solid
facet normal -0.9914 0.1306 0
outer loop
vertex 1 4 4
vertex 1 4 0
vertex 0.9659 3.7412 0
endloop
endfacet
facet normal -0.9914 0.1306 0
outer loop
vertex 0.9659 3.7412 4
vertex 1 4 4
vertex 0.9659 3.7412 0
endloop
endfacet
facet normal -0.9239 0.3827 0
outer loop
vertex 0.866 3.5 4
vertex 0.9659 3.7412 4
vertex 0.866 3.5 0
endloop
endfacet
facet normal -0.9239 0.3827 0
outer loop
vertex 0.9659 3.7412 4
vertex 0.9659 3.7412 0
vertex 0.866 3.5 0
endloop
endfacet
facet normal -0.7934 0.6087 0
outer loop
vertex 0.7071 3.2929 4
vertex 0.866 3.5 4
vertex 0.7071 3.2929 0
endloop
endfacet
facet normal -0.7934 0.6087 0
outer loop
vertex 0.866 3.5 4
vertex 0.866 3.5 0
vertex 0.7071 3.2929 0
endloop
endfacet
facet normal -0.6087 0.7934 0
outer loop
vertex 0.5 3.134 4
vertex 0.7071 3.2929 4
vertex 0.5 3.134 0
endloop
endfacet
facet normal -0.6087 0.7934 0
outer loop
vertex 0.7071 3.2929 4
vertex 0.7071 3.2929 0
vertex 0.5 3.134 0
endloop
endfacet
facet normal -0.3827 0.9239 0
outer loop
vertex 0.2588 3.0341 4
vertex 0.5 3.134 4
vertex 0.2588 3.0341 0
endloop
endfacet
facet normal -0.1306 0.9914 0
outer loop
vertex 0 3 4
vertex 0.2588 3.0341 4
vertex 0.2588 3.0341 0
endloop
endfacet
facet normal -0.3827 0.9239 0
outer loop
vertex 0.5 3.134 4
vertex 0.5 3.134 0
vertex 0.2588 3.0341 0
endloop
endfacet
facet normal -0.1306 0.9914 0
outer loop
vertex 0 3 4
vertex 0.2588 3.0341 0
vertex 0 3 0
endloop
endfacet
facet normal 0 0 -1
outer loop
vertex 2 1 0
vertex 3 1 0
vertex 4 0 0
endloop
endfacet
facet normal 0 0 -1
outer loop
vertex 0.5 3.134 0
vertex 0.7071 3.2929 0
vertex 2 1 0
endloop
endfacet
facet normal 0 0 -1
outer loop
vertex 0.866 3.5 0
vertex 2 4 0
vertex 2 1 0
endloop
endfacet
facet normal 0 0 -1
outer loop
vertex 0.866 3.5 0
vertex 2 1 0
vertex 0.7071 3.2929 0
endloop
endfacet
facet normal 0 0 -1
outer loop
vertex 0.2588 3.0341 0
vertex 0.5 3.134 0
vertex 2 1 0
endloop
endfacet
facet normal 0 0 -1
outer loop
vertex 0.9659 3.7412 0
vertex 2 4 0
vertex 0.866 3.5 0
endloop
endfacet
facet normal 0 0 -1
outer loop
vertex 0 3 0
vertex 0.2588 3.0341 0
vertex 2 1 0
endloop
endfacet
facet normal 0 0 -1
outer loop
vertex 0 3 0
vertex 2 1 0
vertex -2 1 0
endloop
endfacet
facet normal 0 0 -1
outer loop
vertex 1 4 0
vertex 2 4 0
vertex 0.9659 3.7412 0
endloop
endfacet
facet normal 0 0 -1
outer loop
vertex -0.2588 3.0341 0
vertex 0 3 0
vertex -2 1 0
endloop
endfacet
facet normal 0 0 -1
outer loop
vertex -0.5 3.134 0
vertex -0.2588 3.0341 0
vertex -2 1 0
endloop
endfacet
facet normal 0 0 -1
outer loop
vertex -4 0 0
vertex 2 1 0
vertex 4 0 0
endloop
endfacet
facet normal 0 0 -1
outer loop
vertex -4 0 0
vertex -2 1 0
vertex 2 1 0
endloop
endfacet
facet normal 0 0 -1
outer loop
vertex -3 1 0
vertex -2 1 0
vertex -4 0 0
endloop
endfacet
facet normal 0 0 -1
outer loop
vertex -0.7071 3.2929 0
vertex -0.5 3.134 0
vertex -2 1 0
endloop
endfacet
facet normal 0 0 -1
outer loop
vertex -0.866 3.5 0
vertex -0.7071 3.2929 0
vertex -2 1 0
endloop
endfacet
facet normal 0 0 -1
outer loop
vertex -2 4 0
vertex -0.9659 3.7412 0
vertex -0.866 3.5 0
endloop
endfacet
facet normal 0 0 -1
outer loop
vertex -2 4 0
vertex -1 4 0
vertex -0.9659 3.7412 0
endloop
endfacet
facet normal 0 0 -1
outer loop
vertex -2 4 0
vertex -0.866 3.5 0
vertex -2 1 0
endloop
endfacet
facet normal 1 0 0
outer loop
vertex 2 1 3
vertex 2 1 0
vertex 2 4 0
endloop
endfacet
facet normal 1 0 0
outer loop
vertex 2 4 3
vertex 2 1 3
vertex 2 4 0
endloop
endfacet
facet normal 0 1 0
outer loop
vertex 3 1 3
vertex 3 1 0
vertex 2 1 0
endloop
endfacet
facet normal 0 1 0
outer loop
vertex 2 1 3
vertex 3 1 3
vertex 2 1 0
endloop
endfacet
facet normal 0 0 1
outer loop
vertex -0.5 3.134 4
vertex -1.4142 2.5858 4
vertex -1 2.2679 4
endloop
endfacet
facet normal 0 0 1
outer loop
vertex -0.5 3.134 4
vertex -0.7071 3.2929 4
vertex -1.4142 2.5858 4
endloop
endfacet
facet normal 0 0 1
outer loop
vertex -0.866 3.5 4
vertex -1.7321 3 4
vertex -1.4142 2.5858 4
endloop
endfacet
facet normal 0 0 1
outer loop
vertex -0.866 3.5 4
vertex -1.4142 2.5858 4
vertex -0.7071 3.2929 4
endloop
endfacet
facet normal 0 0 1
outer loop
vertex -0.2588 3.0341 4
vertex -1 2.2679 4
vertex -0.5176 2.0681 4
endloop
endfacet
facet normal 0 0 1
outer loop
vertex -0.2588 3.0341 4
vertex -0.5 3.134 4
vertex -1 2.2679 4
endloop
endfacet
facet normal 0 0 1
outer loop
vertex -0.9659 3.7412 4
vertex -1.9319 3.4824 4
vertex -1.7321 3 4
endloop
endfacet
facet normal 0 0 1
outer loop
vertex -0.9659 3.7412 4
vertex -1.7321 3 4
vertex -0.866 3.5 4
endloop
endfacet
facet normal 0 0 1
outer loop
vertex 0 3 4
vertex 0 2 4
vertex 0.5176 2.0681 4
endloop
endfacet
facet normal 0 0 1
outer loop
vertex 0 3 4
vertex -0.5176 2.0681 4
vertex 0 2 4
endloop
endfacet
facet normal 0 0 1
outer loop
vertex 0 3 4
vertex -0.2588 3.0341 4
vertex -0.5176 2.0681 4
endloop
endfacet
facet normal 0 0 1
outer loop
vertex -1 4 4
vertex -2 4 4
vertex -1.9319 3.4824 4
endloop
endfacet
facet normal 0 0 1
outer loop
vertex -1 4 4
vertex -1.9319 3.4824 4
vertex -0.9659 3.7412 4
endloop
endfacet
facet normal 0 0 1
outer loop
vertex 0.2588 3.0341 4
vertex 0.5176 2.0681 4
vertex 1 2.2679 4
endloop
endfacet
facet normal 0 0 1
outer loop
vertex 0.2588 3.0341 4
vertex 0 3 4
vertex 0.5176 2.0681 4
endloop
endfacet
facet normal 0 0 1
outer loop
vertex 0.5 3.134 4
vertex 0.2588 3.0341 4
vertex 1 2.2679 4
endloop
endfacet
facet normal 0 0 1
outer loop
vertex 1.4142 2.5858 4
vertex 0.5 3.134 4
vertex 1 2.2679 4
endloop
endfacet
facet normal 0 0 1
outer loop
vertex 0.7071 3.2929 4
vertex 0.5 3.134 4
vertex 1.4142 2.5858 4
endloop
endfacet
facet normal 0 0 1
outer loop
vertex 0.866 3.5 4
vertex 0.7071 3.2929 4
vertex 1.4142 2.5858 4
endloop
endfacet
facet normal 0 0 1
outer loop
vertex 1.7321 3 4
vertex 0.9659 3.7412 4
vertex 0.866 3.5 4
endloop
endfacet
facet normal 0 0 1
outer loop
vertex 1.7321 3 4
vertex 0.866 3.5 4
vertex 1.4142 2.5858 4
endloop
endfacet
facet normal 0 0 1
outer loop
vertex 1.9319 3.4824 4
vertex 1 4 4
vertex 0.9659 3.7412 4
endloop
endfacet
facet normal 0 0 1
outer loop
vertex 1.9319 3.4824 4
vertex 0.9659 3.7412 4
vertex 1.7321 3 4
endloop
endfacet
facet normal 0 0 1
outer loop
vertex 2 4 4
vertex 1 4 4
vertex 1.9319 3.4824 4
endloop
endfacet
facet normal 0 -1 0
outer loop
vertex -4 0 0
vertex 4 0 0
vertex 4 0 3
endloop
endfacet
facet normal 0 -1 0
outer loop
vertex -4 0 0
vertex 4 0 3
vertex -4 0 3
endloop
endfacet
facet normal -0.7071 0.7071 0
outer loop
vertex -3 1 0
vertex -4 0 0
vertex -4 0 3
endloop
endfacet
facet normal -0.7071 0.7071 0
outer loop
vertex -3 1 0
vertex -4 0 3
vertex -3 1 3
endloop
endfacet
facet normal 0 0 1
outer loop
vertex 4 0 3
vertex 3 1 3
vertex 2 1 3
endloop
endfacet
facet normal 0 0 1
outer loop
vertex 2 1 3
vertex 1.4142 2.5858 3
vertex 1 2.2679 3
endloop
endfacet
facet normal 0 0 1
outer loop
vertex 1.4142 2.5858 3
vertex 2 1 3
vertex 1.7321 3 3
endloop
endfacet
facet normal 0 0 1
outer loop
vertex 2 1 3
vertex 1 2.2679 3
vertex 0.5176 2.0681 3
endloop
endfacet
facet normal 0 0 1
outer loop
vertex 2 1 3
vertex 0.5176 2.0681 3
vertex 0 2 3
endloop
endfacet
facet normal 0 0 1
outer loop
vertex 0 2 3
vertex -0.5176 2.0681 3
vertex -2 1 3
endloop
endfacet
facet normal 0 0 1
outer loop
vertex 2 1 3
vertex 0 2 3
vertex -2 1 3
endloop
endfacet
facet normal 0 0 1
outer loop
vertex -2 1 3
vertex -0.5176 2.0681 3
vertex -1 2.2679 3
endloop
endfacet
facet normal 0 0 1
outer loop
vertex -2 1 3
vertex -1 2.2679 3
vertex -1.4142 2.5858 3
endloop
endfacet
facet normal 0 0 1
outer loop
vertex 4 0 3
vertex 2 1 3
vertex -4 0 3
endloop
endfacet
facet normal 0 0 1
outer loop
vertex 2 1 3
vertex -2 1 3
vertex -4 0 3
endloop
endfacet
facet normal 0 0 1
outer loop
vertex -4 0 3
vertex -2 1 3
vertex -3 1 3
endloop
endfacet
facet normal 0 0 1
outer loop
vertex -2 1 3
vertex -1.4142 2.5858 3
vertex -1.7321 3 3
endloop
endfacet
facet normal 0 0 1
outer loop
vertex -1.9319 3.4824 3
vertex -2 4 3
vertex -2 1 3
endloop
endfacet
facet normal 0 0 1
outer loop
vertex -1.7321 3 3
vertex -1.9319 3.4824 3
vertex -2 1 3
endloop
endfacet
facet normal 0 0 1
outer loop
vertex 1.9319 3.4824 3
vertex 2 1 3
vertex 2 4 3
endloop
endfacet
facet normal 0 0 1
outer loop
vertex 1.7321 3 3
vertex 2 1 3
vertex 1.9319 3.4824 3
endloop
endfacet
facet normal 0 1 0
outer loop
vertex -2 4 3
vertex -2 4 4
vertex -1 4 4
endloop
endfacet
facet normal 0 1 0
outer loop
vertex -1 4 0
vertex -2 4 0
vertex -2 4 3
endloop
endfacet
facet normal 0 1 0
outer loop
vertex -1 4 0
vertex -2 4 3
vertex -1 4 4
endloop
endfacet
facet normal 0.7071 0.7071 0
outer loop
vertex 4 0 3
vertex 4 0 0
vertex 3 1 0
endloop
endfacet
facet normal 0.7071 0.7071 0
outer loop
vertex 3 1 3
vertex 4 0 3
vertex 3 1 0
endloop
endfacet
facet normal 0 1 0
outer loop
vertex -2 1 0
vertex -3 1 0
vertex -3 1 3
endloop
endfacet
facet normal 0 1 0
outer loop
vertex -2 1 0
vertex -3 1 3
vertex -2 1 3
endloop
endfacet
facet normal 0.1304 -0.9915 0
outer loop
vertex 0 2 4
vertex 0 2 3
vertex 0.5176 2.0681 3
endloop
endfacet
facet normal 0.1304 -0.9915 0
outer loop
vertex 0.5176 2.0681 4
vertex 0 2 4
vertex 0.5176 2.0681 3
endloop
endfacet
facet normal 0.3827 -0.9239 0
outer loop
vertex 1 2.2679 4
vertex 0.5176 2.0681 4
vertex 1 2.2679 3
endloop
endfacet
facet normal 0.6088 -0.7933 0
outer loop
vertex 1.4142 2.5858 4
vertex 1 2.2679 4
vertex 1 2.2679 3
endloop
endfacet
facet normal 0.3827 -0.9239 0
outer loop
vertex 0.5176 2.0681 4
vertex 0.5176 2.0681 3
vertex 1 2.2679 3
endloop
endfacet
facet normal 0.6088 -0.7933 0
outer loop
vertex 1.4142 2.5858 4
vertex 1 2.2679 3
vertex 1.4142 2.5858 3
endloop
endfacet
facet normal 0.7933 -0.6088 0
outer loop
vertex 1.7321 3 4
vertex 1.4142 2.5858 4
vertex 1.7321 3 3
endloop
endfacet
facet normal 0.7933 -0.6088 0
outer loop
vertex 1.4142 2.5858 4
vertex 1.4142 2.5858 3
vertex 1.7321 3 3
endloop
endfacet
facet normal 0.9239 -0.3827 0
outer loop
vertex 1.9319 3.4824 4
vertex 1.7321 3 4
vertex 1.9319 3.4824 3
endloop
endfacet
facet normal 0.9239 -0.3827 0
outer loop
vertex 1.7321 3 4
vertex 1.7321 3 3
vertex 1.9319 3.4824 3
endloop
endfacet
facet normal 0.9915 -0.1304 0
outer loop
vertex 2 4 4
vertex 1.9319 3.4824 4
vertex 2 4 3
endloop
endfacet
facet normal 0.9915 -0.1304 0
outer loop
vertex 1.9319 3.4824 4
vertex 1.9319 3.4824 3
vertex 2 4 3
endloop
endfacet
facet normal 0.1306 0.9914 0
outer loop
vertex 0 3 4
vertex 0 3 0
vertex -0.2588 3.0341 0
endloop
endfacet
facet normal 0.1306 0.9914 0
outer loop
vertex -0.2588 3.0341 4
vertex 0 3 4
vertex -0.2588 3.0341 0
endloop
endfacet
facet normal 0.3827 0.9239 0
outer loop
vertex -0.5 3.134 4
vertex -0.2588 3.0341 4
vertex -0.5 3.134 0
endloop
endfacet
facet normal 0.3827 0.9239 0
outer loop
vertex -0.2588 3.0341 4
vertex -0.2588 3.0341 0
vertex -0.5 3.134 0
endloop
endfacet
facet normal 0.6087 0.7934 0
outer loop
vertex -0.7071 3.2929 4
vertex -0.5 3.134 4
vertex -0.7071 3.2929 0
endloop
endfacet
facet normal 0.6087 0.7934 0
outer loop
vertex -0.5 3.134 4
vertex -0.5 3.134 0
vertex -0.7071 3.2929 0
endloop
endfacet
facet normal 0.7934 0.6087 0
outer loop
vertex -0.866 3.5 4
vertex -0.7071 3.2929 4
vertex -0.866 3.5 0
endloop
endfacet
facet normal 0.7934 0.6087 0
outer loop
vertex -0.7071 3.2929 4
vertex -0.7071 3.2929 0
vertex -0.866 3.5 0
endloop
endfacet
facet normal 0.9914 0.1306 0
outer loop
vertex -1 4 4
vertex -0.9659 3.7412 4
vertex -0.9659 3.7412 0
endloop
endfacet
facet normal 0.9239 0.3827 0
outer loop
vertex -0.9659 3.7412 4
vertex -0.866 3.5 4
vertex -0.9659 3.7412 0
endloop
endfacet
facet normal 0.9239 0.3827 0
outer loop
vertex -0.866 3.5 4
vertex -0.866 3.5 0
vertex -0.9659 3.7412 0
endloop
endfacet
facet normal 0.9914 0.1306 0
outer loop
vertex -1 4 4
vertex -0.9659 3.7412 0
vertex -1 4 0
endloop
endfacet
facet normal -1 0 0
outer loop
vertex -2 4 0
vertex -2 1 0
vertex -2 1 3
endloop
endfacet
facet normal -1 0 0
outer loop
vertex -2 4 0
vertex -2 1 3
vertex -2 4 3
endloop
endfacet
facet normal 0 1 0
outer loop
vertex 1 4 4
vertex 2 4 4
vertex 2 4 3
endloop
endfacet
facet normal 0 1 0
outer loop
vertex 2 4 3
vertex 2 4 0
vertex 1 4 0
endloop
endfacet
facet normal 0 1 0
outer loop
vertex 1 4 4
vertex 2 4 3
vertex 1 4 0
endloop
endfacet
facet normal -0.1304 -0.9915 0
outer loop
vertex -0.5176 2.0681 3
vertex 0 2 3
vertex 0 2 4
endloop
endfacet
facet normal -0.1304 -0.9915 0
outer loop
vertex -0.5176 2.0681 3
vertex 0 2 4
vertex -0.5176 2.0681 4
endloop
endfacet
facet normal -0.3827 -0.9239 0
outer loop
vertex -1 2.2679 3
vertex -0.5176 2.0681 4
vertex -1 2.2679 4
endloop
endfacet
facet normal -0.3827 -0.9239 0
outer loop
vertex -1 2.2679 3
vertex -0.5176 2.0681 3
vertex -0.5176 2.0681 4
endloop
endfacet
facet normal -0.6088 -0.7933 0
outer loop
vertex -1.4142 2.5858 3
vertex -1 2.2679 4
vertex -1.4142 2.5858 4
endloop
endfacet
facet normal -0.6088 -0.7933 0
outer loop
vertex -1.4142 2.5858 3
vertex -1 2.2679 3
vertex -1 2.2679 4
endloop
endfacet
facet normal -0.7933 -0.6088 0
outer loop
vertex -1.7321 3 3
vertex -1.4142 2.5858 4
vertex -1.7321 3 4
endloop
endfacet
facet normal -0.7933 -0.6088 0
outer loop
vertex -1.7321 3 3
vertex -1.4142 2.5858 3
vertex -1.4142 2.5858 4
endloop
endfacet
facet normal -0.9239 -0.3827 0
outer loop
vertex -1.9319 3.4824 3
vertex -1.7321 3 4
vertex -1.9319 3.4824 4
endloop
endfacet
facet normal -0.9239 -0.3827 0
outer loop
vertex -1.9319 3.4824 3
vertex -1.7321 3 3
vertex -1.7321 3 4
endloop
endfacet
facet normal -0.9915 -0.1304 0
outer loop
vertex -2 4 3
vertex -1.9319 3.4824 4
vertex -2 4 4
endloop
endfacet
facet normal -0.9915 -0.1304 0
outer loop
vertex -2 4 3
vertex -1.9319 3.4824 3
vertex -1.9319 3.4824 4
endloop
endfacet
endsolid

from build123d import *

# Parameters (mm, degrees)
EXTRUDE_1_DEPTH     = 3
EXTRUDE_2_DEPTH     = 4
CUT_EXTRUDE_1_DEPTH = 4


with BuildPart() as part:
    # 草圖1 → 填料-伸長1 (new body)
    with BuildSketch(Plane.XY):
        Polygon((0, 0), (4, 0), (3, 1), (2, 1), (2, 4), (0, 4), align=None)
    extrude_1 = extrude(amount=EXTRUDE_1_DEPTH)

    # 草圖2 → 填料-伸長2 (add)
    with BuildSketch(Plane.XY):
        with BuildLine():
            ThreePointArc((0, 2), (1.414213562, 2.585786438), (2, 4))
            Line((2, 4), (1, 4))
            ThreePointArc((1, 4), (0.707106781, 3.292893219), (0, 3))
            Line((0, 3), (0, 2))
        make_face()
    extrude_2 = extrude(amount=EXTRUDE_2_DEPTH)

    # 草圖2<3> → 除料-伸長1 (cut)
    with BuildSketch(Plane.XY):
        with BuildLine():
            ThreePointArc((0, 3), (0.707106781, 3.292893219), (1, 4))
            Line((1, 4), (0, 4))
            Line((0, 4), (0, 3))
        make_face()
    cut_extrude_1 = extrude(amount=CUT_EXTRUDE_1_DEPTH, mode=Mode.SUBTRACT)

    # 鏡射1: 填料-伸長1, 填料-伸長2, 除料-伸長1 across plane
    add(extrude_1.mirror(Plane(origin=(0, 0, 0), x_dir=(0, 0, 1), z_dir=(1, 0, 0))))
    add(extrude_2.mirror(Plane(origin=(0, 0, 0), x_dir=(0, 0, 1), z_dir=(1, 0, 0))))
    add(cut_extrude_1.mirror(Plane(origin=(0, 0, 0), x_dir=(0, 0, 1), z_dir=(1, 0, 0))), mode=Mode.SUBTRACT)


solid = part.part
